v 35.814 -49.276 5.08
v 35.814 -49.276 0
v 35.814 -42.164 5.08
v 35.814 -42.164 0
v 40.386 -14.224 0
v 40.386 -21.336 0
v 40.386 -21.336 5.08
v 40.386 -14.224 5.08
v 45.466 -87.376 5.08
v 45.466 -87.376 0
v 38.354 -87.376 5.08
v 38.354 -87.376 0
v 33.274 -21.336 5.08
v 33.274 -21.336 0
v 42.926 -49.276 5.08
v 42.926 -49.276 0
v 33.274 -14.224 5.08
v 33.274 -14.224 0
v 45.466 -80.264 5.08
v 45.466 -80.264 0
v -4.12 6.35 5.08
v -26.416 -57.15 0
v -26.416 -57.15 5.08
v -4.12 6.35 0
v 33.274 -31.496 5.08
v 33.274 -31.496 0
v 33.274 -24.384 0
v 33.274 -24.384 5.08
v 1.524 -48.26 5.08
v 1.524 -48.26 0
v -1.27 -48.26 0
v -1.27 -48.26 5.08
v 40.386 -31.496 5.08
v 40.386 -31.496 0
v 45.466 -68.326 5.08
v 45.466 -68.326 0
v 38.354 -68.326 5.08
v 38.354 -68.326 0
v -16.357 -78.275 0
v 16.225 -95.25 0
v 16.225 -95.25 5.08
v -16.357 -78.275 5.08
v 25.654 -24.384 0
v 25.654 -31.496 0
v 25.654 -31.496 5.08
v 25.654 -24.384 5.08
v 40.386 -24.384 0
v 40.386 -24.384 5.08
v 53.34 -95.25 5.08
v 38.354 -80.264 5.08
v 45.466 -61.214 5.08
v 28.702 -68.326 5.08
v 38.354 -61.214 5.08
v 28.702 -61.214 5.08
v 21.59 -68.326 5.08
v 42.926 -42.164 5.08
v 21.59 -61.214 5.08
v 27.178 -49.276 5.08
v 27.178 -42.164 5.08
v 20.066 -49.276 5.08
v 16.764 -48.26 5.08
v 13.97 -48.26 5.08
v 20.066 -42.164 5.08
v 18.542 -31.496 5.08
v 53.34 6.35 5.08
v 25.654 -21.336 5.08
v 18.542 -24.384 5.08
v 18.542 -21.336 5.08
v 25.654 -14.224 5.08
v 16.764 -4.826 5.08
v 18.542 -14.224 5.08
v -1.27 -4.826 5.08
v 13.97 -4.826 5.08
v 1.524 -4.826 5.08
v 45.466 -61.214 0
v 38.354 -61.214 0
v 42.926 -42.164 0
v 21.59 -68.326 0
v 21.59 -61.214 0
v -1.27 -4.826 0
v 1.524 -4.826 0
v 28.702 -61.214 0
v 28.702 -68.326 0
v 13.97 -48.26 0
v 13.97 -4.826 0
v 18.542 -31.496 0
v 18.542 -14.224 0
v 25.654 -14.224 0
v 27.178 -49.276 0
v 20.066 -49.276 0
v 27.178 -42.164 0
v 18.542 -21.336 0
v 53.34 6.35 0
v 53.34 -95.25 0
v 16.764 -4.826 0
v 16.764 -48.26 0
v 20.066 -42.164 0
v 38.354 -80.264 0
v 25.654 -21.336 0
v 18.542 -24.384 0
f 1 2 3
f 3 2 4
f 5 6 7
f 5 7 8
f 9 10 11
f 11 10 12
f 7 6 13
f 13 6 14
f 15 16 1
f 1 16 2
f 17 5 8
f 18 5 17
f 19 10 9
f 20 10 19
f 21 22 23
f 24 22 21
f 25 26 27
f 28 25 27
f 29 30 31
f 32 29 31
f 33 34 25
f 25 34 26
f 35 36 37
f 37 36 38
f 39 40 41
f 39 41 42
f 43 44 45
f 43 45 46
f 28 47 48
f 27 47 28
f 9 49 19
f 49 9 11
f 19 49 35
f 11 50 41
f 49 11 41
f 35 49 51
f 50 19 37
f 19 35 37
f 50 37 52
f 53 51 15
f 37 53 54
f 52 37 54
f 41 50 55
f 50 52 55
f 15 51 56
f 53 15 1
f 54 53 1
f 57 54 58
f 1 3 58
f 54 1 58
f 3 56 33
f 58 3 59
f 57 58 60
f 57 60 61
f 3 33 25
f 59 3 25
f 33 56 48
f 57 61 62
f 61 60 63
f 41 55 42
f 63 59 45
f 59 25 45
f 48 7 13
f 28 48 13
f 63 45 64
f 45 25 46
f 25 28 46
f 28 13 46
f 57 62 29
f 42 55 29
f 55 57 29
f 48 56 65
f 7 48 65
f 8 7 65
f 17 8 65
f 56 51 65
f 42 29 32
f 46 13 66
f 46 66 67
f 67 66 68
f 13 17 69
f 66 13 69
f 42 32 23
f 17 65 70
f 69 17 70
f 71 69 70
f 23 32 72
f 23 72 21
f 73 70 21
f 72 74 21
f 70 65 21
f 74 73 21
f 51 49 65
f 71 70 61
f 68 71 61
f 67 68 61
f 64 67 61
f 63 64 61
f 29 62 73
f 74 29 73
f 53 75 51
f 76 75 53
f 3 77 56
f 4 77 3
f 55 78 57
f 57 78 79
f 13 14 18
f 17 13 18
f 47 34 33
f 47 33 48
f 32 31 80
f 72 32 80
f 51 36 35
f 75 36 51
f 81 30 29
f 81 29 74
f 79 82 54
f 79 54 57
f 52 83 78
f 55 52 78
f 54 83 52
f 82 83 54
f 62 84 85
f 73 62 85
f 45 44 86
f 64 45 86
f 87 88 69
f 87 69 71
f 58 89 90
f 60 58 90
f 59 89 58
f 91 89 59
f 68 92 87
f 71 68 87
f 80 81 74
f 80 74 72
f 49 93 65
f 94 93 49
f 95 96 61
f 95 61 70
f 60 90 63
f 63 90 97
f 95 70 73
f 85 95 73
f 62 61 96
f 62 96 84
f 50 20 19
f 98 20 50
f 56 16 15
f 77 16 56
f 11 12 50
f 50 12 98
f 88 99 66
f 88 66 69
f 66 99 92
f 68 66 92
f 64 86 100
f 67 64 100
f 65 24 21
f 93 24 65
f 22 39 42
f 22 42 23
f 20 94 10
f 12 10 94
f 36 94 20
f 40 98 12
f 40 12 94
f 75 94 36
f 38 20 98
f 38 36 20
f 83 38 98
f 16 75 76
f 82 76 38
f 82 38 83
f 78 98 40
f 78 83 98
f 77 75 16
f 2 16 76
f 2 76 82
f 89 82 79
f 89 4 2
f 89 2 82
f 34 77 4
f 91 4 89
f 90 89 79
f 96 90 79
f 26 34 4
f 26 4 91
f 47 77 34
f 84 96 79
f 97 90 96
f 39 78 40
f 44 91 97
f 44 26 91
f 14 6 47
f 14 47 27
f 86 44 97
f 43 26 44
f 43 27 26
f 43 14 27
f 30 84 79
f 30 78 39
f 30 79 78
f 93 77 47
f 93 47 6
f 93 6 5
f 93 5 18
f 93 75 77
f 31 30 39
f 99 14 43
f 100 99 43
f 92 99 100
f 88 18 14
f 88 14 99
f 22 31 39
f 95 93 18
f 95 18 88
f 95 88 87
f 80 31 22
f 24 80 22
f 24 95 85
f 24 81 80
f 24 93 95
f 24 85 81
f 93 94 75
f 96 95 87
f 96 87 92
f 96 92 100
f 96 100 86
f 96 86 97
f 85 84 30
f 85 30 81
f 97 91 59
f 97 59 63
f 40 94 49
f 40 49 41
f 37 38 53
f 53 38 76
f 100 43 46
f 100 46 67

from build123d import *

# Parameters (mm, degrees)
BOSS_EXTRUDE1_DEPTH = 5.08
SKETCH5_W           = 7.112
SKETCH5_H           = 7.112
SKETCH5_W_2         = 2.794
SKETCH5_H_2         = 43.434
CUT_EXTRUDE1_DEPTH  = 6.08


with BuildPart() as part:
    # Sketch1 → Boss-Extrude1 (new body)
    with BuildSketch(Plane.XY):
        Polygon((-4.120444444, 6.35), (53.34, 6.35), (53.34, -95.25), (16.22499019, -95.25), (-16.356614113, -78.274710363), (-26.416, -57.15), align=None)
    extrude(amount=BOSS_EXTRUDE1_DEPTH)

    # Sketch5 → Cut-Extrude1 (cut, through all)
    with BuildSketch(Plane(origin=(0, 0, 0), x_dir=(-1, 0, 0), z_dir=(0, 0, -1))):
        with Locations((-36.83, -17.78)):
            Rectangle(SKETCH5_W, SKETCH5_H)
        with Locations((-39.37, -45.72)):
            Rectangle(SKETCH5_W, SKETCH5_H)
        with Locations((-36.83, -27.94)):
            Rectangle(SKETCH5_W, SKETCH5_H)
        with Locations((-41.91, -64.77)):
            Rectangle(SKETCH5_W, SKETCH5_H)
        with Locations((-41.91, -83.82)):
            Rectangle(SKETCH5_W, SKETCH5_H)
        with Locations((-22.098, -17.78)):
            Rectangle(SKETCH5_W, SKETCH5_H)
        with Locations((-22.098, -27.94)):
            Rectangle(SKETCH5_W, SKETCH5_H)
        with Locations((-23.622, -45.72)):
            Rectangle(SKETCH5_W, SKETCH5_H)
        with Locations((-25.146, -64.77)):
            Rectangle(SKETCH5_W, SKETCH5_H)
        with Locations((-15.367, -26.543)):
            Rectangle(SKETCH5_W_2, SKETCH5_H_2)
        with Locations((-0.127, -26.543)):
            Rectangle(SKETCH5_W_2, SKETCH5_H_2)
    extrude(amount=-CUT_EXTRUDE1_DEPTH, mode=Mode.SUBTRACT)


solid = part.part
